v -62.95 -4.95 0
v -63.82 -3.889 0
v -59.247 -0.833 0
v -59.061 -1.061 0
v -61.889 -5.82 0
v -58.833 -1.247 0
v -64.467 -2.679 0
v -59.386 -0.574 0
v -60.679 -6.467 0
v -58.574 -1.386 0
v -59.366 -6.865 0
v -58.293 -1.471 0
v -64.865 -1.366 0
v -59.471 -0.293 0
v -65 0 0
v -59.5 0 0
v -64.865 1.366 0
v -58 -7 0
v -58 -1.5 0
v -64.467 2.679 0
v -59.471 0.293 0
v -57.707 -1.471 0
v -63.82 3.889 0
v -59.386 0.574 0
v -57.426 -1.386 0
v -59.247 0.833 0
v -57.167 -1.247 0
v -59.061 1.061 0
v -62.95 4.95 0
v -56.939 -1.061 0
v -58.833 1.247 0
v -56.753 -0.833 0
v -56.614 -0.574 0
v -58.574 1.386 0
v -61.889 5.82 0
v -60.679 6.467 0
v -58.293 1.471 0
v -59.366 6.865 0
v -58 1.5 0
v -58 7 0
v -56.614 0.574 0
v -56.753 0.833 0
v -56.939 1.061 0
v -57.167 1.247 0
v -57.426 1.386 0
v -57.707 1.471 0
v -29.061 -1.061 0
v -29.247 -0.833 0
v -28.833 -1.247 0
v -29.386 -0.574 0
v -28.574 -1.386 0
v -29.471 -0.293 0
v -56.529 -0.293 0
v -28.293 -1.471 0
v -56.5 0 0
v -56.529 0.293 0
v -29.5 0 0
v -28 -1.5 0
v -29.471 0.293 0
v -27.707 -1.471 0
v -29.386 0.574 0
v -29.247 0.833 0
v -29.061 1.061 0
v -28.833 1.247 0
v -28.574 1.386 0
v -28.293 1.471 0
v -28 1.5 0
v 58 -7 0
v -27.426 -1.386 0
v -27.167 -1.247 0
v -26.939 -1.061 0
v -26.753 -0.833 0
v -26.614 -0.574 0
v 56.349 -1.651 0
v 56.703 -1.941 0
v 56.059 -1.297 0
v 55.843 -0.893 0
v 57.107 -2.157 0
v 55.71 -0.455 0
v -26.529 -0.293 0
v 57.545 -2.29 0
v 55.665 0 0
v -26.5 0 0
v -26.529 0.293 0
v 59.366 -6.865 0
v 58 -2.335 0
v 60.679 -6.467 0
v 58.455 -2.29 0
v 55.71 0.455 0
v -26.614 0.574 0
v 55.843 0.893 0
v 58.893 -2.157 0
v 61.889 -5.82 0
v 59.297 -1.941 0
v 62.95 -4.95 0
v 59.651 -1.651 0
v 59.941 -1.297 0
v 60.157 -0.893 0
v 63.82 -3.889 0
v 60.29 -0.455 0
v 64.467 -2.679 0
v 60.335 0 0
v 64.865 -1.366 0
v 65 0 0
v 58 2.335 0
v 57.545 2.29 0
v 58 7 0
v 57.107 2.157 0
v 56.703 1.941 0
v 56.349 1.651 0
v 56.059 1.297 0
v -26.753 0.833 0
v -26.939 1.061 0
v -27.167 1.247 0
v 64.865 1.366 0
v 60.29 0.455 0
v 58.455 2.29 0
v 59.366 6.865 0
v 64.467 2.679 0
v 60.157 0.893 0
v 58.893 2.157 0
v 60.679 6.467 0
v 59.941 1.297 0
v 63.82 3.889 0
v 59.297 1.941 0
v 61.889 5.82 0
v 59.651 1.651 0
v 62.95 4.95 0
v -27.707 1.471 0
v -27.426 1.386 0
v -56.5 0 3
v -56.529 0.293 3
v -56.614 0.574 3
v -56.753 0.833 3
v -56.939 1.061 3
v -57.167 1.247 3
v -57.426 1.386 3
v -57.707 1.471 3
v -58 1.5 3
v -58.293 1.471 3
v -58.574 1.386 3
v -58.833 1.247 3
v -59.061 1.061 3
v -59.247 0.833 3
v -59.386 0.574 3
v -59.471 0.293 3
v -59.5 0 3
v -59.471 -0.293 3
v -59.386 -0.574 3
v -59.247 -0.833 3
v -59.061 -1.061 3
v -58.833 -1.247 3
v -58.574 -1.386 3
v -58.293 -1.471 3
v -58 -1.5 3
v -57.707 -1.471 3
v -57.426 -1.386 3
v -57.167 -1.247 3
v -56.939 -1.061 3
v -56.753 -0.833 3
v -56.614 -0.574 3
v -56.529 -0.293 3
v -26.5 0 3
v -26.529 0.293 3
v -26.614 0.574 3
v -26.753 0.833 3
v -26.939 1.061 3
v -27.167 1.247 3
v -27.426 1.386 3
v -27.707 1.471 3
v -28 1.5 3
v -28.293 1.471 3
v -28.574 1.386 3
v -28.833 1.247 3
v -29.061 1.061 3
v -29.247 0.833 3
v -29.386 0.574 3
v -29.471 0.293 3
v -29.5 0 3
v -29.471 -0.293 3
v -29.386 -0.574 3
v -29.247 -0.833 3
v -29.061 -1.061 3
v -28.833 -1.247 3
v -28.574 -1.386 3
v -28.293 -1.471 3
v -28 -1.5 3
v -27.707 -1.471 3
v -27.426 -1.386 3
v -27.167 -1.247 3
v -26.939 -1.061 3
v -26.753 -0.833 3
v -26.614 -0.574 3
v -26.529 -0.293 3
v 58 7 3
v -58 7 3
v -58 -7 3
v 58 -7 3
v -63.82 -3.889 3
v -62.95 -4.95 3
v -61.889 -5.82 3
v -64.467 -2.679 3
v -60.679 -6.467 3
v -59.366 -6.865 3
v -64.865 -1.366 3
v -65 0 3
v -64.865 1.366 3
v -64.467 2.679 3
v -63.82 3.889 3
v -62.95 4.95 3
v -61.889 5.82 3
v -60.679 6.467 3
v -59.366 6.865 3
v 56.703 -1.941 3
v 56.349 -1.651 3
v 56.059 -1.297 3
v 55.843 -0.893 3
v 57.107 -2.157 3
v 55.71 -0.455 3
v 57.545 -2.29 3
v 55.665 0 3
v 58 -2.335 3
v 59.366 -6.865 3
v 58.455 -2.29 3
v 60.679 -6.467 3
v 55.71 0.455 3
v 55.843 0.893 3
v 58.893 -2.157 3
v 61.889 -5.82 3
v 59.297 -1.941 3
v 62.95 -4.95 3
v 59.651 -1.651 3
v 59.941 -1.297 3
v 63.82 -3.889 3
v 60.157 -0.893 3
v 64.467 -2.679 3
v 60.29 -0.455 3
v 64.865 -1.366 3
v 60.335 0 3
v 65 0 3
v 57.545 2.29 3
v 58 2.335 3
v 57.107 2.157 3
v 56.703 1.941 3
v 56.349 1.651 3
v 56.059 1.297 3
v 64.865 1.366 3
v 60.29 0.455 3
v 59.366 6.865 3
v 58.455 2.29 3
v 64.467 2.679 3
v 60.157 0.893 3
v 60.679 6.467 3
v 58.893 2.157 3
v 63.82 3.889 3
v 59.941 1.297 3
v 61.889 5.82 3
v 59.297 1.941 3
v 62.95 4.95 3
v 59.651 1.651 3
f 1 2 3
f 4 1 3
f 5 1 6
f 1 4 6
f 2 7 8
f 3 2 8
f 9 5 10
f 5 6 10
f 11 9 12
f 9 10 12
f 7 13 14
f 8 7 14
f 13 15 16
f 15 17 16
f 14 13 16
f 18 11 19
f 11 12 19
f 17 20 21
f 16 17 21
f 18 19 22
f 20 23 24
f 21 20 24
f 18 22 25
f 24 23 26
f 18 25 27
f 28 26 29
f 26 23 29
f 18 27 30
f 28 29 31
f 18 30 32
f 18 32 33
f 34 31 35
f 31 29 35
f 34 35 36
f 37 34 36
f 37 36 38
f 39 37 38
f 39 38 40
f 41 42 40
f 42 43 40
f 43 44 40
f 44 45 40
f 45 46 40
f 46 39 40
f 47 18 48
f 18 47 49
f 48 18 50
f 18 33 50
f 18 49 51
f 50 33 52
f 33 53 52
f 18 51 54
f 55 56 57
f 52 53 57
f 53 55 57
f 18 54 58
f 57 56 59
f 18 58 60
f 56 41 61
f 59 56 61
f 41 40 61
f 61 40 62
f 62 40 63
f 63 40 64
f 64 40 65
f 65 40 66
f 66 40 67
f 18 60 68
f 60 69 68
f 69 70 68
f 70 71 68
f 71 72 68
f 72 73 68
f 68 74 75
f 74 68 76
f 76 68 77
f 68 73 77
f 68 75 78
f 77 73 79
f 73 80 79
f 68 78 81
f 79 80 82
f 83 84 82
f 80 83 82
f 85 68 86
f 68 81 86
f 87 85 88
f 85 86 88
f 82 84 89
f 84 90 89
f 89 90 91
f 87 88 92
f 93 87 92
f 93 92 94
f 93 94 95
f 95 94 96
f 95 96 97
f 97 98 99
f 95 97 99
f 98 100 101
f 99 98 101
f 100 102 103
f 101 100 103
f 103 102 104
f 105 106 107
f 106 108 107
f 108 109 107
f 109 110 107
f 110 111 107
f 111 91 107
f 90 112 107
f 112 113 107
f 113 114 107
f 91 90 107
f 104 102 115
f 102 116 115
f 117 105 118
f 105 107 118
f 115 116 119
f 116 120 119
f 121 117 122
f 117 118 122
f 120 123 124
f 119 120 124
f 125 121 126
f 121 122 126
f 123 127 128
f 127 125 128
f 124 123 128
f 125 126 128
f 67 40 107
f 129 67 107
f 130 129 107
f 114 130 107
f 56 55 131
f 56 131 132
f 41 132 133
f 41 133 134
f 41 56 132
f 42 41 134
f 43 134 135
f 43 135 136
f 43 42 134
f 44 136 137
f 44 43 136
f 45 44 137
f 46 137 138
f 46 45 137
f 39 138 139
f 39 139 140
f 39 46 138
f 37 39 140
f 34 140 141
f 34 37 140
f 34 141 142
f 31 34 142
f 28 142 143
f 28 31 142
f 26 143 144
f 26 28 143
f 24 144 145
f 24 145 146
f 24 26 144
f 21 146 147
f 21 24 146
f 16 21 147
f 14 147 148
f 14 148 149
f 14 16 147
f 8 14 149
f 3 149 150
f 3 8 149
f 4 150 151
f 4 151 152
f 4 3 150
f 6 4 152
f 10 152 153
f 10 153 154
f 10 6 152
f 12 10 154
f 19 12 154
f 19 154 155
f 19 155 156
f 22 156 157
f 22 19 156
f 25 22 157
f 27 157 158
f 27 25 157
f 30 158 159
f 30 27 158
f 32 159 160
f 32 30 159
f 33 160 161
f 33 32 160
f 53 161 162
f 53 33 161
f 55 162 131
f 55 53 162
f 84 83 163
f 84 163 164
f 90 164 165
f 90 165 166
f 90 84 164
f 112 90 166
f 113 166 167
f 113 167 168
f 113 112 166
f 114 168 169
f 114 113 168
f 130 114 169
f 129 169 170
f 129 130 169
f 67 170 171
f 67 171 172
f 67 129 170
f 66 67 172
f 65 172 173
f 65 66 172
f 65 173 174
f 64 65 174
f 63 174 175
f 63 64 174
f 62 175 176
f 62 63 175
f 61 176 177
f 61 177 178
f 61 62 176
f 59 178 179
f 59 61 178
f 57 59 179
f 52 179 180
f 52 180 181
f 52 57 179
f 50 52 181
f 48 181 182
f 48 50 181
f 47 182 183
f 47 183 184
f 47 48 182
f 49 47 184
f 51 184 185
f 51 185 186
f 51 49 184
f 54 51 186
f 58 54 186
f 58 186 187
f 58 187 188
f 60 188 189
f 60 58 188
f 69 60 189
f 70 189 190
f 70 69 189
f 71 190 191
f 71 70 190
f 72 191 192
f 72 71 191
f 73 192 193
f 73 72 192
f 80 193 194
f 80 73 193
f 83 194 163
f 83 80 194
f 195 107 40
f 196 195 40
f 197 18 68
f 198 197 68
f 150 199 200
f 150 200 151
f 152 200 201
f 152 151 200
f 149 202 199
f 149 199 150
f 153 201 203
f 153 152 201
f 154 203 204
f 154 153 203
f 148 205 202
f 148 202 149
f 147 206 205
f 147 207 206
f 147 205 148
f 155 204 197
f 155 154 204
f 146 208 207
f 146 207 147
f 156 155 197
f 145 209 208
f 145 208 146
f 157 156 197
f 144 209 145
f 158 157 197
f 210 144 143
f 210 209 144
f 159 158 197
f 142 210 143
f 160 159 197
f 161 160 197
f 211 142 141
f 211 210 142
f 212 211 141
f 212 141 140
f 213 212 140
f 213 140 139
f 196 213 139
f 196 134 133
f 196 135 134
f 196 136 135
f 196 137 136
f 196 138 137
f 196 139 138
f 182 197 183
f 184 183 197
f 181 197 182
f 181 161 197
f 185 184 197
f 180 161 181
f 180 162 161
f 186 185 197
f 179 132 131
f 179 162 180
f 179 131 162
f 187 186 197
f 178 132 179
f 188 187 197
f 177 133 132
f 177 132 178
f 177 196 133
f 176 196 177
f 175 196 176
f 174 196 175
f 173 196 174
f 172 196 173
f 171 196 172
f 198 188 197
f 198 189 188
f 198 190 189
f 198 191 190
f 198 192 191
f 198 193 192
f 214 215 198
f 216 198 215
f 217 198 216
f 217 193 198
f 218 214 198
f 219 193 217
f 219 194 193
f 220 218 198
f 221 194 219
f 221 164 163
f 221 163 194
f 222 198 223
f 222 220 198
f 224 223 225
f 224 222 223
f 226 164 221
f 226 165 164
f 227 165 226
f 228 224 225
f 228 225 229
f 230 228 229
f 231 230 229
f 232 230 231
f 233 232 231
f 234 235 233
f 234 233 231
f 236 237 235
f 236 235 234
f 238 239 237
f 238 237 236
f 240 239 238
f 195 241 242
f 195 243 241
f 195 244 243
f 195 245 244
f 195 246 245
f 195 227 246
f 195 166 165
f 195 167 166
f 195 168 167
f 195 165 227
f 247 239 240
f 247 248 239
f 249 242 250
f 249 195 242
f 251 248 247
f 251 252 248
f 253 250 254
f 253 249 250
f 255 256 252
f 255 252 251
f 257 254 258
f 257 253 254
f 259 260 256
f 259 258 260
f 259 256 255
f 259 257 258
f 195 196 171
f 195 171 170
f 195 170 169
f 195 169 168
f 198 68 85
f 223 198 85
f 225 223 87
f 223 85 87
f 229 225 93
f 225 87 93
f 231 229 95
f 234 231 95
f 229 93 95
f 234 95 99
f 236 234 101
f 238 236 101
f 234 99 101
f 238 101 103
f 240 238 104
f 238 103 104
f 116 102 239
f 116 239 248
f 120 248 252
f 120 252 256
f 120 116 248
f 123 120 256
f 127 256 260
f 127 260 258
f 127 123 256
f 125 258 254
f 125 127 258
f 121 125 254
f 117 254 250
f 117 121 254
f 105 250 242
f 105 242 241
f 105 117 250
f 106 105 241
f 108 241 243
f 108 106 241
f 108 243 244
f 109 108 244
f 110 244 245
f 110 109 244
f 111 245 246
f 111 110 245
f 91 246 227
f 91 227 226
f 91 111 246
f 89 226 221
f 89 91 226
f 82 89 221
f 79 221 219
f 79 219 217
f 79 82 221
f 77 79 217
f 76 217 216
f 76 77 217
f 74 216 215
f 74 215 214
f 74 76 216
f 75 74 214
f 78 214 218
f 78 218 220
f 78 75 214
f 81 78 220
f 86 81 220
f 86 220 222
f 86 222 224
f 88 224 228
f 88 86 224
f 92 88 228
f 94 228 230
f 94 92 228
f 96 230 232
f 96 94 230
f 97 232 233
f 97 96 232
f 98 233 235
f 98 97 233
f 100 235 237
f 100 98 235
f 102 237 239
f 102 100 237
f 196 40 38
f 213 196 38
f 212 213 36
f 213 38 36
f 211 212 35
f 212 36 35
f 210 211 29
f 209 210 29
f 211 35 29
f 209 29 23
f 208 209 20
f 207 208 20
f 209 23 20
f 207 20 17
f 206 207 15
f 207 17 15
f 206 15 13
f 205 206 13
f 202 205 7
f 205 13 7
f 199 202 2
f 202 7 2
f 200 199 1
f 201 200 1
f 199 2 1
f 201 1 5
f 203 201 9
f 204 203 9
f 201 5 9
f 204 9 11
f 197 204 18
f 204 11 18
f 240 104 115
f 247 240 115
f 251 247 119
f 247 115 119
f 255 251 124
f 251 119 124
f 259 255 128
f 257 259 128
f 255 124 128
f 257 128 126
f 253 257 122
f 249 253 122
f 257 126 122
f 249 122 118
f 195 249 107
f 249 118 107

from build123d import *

# Parameters (mm, degrees)
F0_R     = 1.5
F0_R_2   = 2.334565
F1_DEPTH = 3


with BuildPart() as f1:
    # F0 (on Top) → F1 (new body)
    with BuildSketch(Plane.XY):
        with BuildLine():
            ThreePointArc((-65, 0), (-62.949747, -4.949747), (-58, -7))
            Line((-58, -7), (58, -7))
            ThreePointArc((58, -7), (62.949747, -4.949747), (65, 0))
            ThreePointArc((65, 0), (62.949747, 4.949747), (58, 7))
            Line((58, 7), (-58, 7))
            ThreePointArc((-58, 7), (-62.949747, 4.949747), (-65, 0))
        make_face()
        with Locations((-58, 0)):
            Circle(F0_R, mode=Mode.SUBTRACT)
        with Locations((-28, 0)):
            Circle(F0_R, mode=Mode.SUBTRACT)
        with Locations((58, 0)):
            Circle(F0_R_2, mode=Mode.SUBTRACT)
    extrude(amount=F1_DEPTH)


solid = f1.part
